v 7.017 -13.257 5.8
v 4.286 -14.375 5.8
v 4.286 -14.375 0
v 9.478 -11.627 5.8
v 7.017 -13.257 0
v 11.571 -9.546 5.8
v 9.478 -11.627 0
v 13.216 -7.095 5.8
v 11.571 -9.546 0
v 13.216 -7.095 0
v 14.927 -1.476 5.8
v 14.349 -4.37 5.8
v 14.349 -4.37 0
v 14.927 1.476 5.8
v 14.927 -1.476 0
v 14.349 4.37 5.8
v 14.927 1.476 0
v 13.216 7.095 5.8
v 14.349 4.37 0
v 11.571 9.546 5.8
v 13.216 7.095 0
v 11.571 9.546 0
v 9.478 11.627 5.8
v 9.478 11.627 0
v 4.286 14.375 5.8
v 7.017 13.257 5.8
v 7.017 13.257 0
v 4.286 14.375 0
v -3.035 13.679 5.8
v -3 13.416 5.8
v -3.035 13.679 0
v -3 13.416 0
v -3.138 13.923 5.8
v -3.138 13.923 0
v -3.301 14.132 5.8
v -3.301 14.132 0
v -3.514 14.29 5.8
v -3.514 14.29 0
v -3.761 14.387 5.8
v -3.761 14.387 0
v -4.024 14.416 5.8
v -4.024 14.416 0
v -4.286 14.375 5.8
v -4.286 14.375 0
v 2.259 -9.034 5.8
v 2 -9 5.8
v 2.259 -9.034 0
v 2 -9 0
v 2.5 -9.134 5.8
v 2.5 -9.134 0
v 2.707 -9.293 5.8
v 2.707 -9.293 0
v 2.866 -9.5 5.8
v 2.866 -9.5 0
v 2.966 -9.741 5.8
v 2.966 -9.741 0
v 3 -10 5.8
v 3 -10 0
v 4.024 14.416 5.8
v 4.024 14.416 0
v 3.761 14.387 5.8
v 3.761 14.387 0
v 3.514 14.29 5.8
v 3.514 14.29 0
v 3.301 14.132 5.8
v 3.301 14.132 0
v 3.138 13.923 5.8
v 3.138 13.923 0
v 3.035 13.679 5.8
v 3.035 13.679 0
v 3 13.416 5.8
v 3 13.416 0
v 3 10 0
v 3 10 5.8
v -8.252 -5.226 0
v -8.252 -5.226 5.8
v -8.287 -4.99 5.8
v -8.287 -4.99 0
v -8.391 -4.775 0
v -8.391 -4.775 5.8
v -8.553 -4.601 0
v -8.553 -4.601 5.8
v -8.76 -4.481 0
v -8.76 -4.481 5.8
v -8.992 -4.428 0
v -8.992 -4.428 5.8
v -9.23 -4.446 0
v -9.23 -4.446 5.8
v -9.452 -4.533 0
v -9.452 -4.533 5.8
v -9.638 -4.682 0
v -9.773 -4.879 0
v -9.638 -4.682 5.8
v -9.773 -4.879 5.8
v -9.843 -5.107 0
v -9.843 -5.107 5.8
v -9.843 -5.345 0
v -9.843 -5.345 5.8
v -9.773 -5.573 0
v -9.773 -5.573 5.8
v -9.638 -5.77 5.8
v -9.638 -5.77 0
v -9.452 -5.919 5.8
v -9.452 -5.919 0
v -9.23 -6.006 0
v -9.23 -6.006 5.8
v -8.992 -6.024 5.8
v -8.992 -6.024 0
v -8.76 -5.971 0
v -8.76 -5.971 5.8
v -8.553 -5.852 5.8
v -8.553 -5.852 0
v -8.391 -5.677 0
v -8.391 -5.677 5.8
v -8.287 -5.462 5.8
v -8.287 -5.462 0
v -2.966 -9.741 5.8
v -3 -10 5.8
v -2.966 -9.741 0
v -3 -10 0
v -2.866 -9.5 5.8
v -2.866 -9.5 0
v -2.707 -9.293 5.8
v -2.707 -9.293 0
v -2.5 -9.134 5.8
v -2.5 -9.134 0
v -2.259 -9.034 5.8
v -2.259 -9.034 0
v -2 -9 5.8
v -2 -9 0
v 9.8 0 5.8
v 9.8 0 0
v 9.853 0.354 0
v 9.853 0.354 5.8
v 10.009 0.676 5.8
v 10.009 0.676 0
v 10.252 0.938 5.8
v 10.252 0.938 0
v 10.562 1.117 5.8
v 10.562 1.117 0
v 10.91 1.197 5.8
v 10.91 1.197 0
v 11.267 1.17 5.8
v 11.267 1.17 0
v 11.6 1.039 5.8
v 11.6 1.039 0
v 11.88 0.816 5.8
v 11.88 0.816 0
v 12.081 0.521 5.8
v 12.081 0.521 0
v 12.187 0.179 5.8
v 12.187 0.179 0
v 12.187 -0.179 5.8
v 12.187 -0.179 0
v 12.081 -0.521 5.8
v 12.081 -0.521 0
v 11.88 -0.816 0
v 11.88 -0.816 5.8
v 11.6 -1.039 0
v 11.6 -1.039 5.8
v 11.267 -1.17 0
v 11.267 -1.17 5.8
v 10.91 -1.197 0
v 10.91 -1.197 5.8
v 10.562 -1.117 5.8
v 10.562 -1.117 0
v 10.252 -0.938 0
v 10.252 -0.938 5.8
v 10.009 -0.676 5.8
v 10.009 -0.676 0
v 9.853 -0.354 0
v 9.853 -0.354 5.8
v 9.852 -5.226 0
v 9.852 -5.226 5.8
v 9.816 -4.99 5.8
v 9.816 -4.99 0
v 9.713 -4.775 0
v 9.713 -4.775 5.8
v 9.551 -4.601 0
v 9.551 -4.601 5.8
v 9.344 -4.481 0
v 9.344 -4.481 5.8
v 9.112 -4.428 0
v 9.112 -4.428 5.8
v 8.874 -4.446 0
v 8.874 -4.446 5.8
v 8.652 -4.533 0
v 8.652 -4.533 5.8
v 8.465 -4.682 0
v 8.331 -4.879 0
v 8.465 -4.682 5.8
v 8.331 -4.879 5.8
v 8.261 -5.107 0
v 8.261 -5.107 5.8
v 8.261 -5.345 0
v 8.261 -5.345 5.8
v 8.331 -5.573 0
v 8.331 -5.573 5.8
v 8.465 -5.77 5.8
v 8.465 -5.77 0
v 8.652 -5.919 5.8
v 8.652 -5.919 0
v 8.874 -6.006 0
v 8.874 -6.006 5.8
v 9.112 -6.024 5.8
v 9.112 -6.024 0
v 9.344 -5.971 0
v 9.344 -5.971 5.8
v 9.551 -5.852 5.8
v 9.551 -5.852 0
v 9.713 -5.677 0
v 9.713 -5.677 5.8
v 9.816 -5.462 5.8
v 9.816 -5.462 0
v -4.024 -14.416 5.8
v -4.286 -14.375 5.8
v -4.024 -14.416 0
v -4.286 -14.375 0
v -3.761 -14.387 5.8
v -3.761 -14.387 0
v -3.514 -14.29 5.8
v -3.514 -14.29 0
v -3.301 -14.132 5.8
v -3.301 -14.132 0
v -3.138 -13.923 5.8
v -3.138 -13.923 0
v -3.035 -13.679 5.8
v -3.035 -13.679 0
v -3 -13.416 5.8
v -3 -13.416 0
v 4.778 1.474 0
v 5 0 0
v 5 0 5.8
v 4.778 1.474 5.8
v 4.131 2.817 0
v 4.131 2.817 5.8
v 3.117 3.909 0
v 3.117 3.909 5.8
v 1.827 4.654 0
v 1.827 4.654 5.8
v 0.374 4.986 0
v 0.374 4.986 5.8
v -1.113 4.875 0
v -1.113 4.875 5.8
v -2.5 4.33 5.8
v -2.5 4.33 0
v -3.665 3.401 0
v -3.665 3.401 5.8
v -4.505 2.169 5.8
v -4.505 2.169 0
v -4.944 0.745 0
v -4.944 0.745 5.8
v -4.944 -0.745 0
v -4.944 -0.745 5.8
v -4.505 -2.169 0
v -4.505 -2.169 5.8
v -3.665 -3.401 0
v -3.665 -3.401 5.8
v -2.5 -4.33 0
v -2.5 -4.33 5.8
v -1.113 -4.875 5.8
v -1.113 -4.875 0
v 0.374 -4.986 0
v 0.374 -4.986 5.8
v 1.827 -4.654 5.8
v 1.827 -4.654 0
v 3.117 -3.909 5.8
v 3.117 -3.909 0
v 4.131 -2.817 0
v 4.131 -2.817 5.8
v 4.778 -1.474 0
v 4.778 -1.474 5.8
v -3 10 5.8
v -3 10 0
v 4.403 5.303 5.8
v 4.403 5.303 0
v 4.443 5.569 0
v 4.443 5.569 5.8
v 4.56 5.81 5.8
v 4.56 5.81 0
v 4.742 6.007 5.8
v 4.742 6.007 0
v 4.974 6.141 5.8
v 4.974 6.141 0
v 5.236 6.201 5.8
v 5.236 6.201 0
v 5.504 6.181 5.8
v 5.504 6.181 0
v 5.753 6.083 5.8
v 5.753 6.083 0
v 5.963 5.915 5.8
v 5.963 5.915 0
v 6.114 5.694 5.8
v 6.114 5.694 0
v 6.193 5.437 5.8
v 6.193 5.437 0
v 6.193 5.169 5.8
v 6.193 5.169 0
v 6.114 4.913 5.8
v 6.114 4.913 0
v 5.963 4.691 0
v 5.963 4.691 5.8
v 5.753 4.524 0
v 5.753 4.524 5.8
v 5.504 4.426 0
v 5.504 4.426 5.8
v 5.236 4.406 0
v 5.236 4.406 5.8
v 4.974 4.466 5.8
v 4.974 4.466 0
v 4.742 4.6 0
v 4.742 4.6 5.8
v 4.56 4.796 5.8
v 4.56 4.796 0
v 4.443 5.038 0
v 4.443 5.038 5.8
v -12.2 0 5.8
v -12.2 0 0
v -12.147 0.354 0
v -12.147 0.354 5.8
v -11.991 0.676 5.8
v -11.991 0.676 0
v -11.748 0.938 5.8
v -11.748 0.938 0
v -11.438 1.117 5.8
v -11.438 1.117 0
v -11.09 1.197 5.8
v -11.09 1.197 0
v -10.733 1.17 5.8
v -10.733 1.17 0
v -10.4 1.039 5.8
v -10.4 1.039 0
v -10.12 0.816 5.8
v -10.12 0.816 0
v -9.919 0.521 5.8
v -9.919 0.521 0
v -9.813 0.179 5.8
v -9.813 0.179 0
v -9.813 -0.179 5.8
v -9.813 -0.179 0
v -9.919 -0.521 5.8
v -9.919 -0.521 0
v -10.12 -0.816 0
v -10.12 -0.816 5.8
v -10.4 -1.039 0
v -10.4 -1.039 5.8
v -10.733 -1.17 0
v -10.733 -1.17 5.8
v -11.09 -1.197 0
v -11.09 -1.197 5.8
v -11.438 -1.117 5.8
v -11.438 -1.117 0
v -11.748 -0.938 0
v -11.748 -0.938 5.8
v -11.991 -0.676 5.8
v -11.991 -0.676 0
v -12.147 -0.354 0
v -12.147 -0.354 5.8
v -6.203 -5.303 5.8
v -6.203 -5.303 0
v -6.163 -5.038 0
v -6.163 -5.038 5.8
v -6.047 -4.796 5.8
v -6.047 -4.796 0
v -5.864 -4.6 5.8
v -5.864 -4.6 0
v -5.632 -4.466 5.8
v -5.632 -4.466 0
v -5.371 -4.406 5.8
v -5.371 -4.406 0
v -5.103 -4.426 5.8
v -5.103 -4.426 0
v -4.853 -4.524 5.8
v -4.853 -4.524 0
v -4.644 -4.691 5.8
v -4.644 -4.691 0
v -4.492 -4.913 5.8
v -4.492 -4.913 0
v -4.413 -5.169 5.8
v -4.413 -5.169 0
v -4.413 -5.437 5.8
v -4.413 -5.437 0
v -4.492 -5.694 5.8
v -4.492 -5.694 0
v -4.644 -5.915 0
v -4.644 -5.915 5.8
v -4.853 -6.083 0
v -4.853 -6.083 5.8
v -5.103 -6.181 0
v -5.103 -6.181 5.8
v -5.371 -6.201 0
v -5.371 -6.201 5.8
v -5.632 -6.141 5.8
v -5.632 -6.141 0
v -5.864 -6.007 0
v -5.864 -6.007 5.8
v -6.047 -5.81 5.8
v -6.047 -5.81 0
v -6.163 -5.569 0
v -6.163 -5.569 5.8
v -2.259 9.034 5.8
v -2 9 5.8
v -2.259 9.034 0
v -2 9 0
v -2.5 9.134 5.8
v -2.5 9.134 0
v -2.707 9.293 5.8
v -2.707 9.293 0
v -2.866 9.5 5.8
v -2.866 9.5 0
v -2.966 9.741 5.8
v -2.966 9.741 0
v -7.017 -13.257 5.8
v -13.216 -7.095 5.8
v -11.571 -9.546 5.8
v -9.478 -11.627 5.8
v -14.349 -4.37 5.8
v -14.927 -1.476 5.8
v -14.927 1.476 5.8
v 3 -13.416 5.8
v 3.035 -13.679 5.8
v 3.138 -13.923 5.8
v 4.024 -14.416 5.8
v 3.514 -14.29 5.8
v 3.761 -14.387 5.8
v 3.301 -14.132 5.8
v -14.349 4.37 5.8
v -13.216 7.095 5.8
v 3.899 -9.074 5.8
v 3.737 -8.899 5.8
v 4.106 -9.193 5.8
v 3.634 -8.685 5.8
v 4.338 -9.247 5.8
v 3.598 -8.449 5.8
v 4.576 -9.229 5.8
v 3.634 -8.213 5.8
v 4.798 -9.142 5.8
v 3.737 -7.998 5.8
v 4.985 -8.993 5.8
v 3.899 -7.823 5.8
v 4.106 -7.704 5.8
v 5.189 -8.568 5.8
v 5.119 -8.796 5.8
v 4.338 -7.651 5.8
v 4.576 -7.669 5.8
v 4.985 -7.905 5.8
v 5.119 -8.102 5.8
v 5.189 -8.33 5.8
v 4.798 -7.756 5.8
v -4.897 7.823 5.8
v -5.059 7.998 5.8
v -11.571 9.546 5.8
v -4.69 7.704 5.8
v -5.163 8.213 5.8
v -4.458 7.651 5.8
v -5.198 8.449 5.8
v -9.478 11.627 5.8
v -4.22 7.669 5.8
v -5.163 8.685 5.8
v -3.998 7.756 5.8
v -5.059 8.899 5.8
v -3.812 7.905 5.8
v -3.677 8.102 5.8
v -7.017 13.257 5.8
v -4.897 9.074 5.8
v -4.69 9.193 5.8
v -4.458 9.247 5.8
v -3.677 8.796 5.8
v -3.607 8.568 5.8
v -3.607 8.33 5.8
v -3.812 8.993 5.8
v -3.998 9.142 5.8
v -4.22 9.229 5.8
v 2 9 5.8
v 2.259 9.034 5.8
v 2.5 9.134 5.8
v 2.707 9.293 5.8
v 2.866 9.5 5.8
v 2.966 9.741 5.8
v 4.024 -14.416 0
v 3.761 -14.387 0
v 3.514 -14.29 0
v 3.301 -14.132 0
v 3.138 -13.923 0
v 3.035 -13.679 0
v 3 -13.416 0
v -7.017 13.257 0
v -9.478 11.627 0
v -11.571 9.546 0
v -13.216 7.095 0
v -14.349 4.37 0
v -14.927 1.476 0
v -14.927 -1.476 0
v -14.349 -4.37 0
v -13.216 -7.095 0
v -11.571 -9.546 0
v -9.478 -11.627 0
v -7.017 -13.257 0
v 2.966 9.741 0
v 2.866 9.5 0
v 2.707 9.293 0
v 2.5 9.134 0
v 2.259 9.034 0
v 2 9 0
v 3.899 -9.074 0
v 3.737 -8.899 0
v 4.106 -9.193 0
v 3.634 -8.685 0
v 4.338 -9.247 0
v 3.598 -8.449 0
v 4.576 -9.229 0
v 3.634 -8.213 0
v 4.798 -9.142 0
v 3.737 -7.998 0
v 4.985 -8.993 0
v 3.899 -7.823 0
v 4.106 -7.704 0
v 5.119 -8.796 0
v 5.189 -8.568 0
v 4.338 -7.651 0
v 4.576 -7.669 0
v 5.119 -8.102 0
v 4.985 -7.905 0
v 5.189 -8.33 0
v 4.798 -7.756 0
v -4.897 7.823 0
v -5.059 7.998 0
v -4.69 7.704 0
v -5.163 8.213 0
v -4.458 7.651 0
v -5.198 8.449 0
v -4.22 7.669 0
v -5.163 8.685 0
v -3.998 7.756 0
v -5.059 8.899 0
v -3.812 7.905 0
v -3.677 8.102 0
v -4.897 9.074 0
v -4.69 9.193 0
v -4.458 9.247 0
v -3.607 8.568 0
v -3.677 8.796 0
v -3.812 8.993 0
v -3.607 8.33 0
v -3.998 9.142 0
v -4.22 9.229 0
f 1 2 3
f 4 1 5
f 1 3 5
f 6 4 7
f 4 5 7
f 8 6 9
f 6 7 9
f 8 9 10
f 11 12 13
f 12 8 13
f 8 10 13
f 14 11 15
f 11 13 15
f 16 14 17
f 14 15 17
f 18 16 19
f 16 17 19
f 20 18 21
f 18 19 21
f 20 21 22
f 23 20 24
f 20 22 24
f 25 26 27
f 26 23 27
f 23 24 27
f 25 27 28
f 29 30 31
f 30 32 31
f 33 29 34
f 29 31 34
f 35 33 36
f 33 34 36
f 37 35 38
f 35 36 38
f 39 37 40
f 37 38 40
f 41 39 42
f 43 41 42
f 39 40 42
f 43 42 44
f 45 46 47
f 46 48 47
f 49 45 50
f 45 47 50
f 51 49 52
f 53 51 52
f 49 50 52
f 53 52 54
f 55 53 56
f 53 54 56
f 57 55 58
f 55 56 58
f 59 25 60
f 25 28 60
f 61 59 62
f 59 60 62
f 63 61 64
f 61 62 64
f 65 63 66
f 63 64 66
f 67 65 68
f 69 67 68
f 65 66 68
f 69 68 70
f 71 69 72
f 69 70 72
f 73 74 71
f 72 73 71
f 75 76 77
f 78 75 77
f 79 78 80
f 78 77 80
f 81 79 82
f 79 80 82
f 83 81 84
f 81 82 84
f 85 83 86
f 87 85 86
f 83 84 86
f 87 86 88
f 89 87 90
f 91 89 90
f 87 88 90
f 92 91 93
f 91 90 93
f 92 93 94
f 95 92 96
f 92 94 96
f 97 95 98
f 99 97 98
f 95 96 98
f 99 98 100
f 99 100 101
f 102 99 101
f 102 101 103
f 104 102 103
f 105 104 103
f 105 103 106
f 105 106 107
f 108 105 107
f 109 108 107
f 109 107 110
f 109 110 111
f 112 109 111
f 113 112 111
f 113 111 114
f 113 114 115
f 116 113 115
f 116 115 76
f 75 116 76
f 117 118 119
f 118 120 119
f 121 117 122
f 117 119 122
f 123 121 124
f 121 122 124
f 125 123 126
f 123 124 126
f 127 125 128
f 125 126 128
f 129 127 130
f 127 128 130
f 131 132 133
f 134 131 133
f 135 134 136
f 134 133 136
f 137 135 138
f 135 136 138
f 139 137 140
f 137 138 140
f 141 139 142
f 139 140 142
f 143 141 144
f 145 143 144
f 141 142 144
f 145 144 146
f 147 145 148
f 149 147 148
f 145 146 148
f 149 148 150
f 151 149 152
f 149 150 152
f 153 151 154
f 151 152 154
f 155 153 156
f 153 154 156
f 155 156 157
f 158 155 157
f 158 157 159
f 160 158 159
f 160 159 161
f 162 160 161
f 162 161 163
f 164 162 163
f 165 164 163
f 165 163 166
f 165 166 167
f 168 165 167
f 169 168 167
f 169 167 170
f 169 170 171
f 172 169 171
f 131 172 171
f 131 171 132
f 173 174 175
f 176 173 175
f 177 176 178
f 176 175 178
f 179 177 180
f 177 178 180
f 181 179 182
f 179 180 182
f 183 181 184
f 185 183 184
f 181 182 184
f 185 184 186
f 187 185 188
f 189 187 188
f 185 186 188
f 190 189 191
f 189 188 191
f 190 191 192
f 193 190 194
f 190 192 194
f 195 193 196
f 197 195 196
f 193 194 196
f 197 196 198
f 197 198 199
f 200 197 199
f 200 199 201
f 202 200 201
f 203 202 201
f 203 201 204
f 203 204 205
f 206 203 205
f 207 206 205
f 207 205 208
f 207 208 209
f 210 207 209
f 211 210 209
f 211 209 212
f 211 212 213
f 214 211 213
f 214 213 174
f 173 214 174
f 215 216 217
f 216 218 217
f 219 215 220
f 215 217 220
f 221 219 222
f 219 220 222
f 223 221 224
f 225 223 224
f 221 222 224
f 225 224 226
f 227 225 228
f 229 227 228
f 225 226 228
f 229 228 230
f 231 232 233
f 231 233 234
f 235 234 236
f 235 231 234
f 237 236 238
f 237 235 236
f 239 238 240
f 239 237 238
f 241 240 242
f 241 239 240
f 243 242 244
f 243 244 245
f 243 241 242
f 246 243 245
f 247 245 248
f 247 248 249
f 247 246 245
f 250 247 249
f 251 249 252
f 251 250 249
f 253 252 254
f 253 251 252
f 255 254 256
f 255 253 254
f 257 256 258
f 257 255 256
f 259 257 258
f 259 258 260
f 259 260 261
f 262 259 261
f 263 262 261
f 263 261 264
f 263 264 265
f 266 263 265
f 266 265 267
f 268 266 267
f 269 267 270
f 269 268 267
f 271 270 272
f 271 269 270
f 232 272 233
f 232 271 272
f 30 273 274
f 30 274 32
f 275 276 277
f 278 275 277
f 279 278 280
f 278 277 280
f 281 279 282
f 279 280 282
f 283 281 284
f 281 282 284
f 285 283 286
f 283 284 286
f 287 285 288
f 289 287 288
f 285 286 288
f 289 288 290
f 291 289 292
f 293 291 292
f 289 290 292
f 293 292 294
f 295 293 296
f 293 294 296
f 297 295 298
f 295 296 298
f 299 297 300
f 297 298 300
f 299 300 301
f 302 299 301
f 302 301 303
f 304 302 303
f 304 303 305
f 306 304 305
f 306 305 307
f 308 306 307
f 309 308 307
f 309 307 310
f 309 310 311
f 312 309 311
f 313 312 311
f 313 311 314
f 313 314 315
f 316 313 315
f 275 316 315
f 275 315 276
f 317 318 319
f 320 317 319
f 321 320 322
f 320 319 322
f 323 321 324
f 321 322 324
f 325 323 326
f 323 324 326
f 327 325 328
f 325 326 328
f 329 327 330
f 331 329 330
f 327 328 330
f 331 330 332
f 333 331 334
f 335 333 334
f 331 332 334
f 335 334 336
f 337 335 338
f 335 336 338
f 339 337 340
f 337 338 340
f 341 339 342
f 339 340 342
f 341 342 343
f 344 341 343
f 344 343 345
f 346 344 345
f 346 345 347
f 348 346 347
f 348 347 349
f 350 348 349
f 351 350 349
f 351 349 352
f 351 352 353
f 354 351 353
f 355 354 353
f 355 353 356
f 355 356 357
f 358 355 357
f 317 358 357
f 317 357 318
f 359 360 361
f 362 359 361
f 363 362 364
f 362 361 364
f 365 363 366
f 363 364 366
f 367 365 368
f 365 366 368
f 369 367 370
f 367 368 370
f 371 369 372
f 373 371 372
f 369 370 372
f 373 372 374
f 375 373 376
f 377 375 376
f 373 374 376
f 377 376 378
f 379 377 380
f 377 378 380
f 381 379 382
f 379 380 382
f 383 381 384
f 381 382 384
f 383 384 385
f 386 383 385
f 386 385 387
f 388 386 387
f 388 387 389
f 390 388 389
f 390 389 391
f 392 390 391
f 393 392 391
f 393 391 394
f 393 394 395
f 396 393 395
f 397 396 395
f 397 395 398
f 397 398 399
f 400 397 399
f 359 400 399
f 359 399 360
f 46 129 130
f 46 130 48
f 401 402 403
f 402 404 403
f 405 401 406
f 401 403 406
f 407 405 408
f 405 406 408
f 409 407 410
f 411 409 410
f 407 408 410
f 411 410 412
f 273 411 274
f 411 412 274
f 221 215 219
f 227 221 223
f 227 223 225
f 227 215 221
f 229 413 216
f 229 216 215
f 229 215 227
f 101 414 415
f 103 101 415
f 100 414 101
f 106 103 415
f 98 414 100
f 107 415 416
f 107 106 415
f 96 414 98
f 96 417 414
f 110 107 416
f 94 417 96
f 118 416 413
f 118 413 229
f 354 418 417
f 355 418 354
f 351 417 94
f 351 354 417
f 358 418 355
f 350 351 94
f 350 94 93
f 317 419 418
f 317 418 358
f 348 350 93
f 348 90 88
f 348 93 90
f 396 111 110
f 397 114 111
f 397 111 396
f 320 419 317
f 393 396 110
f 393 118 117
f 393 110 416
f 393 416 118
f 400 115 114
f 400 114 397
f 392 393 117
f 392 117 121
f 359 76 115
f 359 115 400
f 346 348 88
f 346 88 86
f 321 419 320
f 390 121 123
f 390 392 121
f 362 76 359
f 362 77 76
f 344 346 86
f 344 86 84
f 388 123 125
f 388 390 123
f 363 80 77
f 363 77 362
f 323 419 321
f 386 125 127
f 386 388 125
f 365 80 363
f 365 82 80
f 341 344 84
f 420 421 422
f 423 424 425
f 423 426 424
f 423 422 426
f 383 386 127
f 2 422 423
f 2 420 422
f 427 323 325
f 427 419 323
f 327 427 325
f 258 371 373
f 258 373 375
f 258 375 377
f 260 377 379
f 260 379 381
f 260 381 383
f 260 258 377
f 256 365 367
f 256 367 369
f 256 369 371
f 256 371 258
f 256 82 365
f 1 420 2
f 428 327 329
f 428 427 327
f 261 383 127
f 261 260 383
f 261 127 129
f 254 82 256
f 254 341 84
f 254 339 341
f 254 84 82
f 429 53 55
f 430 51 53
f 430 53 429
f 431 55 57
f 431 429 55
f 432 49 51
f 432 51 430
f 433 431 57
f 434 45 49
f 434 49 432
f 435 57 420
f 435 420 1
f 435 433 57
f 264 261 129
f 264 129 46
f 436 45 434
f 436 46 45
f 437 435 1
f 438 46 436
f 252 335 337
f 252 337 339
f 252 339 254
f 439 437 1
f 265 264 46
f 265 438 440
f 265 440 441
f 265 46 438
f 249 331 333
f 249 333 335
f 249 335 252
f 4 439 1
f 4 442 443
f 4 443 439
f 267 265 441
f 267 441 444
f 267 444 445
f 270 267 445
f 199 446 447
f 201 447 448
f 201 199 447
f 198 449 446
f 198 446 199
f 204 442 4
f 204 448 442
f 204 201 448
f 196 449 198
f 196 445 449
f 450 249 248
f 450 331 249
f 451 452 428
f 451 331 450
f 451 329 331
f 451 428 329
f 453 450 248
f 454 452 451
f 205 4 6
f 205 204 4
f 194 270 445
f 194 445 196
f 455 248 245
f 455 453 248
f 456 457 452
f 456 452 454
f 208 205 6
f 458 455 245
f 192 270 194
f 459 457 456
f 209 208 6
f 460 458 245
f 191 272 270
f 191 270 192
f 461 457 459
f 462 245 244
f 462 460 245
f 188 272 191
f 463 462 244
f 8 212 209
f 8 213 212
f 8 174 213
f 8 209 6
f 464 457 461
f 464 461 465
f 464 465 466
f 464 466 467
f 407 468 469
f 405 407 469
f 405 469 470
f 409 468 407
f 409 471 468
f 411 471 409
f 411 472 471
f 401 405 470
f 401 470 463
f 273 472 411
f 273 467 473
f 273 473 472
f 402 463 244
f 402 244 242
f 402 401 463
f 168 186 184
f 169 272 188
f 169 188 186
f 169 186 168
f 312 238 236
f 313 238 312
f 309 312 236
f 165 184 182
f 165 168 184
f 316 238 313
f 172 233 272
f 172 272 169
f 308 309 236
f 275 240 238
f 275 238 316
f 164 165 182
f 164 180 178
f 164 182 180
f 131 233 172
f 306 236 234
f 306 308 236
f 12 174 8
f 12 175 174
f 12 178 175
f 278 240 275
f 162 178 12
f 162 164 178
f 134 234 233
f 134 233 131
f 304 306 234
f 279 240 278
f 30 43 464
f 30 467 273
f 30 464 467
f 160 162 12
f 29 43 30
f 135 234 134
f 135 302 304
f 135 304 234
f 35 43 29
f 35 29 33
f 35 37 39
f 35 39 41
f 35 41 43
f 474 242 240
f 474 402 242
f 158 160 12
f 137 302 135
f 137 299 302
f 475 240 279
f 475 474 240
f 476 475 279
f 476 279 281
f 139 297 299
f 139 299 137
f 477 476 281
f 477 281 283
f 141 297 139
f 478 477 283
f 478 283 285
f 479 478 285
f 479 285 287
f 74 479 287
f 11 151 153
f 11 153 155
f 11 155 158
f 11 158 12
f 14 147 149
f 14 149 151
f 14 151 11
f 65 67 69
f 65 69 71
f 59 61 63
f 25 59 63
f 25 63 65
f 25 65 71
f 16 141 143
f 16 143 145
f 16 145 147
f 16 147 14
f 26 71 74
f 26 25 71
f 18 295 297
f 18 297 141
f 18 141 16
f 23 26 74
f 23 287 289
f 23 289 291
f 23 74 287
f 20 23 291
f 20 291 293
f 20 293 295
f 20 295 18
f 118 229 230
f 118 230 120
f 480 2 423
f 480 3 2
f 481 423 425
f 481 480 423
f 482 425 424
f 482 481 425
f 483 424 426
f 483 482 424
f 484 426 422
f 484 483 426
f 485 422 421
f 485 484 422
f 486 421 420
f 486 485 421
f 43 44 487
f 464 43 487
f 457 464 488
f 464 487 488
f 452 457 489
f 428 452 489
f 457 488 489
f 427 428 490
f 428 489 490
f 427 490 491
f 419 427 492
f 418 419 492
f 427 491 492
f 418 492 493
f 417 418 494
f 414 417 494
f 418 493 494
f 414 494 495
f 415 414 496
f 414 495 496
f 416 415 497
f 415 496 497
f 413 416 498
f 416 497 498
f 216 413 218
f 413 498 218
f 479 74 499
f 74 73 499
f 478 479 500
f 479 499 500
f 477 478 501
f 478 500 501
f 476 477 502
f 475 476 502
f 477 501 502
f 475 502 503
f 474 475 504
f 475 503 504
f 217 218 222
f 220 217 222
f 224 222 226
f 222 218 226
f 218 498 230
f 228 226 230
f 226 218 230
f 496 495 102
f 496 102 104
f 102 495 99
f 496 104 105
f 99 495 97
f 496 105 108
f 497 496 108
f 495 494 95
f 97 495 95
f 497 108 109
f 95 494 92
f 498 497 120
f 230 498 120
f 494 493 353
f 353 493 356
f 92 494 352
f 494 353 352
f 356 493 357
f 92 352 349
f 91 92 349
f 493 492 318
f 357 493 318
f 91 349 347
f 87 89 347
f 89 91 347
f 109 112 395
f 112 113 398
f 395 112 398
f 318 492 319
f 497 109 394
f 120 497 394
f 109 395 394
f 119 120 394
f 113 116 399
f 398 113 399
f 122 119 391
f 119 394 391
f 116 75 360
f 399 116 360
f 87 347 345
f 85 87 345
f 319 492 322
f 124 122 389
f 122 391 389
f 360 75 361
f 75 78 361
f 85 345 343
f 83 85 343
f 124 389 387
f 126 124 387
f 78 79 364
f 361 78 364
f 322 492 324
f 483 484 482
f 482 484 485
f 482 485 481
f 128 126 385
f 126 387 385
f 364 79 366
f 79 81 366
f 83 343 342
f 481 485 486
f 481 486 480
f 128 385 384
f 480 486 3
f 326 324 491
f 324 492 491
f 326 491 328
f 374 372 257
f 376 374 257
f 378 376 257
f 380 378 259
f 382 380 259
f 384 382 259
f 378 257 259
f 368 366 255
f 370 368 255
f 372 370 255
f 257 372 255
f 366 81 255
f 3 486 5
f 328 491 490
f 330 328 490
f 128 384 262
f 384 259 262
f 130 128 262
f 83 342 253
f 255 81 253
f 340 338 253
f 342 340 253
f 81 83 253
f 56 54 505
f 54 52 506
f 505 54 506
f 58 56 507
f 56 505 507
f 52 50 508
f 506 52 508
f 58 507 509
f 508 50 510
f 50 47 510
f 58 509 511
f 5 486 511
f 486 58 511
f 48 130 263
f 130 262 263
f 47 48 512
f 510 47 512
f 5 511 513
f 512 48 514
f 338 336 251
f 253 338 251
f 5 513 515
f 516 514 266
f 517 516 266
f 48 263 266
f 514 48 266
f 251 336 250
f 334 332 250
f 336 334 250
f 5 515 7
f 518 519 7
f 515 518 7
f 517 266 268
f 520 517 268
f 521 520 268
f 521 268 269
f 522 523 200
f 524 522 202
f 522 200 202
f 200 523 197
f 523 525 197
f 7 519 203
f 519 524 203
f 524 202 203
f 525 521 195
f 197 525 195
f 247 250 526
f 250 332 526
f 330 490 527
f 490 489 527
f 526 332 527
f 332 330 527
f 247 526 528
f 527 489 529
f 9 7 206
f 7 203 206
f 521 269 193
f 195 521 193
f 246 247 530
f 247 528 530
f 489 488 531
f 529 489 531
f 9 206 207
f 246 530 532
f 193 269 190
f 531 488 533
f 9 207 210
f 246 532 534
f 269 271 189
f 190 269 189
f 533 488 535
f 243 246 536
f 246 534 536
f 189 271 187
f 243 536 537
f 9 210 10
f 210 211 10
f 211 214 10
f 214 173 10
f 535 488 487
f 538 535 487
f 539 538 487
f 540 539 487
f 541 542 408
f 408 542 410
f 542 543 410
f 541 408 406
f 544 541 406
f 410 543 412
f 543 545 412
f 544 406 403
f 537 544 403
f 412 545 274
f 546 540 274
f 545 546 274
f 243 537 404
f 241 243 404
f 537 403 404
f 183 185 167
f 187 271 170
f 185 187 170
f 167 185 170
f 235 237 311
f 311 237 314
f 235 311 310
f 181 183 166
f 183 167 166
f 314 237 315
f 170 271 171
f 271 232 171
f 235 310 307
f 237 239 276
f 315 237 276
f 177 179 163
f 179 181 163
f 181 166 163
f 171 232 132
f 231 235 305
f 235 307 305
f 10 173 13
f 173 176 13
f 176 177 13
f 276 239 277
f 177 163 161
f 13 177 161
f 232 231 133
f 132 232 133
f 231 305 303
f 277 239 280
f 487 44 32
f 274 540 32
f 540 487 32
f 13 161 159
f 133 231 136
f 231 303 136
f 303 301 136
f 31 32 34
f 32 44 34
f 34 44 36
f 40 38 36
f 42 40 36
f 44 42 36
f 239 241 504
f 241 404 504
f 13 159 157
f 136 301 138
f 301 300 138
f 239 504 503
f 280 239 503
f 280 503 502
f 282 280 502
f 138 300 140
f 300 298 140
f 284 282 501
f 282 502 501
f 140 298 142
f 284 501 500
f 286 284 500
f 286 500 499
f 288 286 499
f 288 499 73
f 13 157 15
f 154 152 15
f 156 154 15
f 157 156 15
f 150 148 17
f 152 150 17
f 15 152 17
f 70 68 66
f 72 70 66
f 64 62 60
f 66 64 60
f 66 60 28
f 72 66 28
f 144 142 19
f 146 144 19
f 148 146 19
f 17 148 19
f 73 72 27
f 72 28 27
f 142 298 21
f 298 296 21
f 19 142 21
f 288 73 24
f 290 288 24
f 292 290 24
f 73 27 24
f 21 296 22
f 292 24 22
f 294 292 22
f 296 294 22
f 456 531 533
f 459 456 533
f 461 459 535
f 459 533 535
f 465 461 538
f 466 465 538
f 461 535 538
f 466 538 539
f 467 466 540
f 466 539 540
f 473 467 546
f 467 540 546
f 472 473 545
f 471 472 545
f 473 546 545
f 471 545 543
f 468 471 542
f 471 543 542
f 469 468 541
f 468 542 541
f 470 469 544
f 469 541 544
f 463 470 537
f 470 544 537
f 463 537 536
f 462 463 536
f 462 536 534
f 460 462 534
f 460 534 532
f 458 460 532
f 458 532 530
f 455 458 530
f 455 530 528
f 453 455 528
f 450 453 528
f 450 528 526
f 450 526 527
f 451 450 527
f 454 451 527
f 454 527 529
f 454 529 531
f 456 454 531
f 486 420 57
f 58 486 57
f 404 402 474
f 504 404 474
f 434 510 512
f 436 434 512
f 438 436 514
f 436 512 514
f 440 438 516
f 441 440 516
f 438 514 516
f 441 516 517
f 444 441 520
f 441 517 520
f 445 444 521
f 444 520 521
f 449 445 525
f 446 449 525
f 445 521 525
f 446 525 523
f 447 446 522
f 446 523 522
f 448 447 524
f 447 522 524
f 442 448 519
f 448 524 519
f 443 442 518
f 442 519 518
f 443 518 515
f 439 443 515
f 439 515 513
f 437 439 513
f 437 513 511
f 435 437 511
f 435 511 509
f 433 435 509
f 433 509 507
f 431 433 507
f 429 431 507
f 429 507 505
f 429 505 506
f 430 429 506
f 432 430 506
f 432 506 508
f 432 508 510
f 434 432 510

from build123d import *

# Parameters (mm, degrees)
SKETCH1_R                  = 15
SKETCH1_R_2                = 5
BOSS_EXTRUDE1_DEPTH        = 5.8
M2_CLEARANCE_HOLE1_D       = 2.4
M2_CLEARANCE_HOLE1_DEPTH   = 25.4
M2_CLEARANCE_HOLE1_TIP     = 0.721032743
M1_6_CLEARANCE_HOLE1_D     = 1.8
M1_6_CLEARANCE_HOLE1_DEPTH = 25.4
M1_6_CLEARANCE_HOLE1_TIP   = 0.540774557
SKETCH8_W                  = 6
SKETCH8_H                  = 6
CUT_EXTRUDE1_DEPTH         = 22.99181666
FILLET1_R                  = 1
M2X0_4_TAPPED_HOLE1_D      = 1.6
M2X0_4_TAPPED_HOLE1_DEPTH  = 5.99948
M2X0_4_TAPPED_HOLE1_TIP    = 0.480688495
M2X0_4_TAPPED_HOLE2_D      = 1.6
M2X0_4_TAPPED_HOLE2_DEPTH  = 5.99948
M2X0_4_TAPPED_HOLE2_TIP    = 0.480688495


with BuildPart() as part:
    # Sketch1 → Boss-Extrude1 (new body)
    with BuildSketch(Plane.XY):
        Circle(SKETCH1_R)
        Circle(SKETCH1_R_2, mode=Mode.SUBTRACT)
    extrude(amount=BOSS_EXTRUDE1_DEPTH)

    # M2 Clearance Hole1
    with Locations(Plane.XY.offset(5.8)):
        with Locations((-11, 0), (11, 0)):
            Hole(M2_CLEARANCE_HOLE1_D / 2, depth=M2_CLEARANCE_HOLE1_DEPTH)
            with Locations((0, 0, -(M2_CLEARANCE_HOLE1_DEPTH + M2_CLEARANCE_HOLE1_TIP / 2))):  # 118° drill point
                Cone(0, M2_CLEARANCE_HOLE1_D / 2, M2_CLEARANCE_HOLE1_TIP, mode=Mode.SUBTRACT)

    # M1.6 Clearance Hole1
    with Locations(Plane.XY.offset(5.8)):
        with Locations((5.303300859, 5.303300859), (-5.303300859, -5.303300859)):
            Hole(M1_6_CLEARANCE_HOLE1_D / 2, depth=M1_6_CLEARANCE_HOLE1_DEPTH)
            with Locations((0, 0, -(M1_6_CLEARANCE_HOLE1_DEPTH + M1_6_CLEARANCE_HOLE1_TIP / 2))):  # 118° drill point
                Cone(0, M1_6_CLEARANCE_HOLE1_D / 2, M1_6_CLEARANCE_HOLE1_TIP, mode=Mode.SUBTRACT)

    # Sketch8 → Cut-Extrude1 (cut, through all)
    with BuildSketch(Plane.XY.offset(5.8)):
        with Locations((0, -12)):
            Rectangle(SKETCH8_W, SKETCH8_H)
        with Locations((0, 12)):
            Rectangle(SKETCH8_W, SKETCH8_H)
    extrude(amount=-CUT_EXTRUDE1_DEPTH, mode=Mode.SUBTRACT)

    # Fillet1
    fillet1_edges = [part.edges().sort_by_distance(p)[0] for p in [
        (-3, -14.696938457, 2.9),
        (3, -14.696938457, 2.9),
        (3, -9, 2.9),
        (-3, -9, 2.9),
        (-3, 14.696938457, 2.9),
        (3, 14.696938457, 2.9),
        (-3, 9, 2.9),
        (3, 9, 2.9),
    ]]
    fillet(fillet1_edges, radius=FILLET1_R)

    # M2x0.4 Tapped Hole1
    with Locations(Plane.XY.offset(5.8)):
        with Locations((-4.398155541, 8.448778186), (4.398155541, -8.448778186)):
            Hole(M2X0_4_TAPPED_HOLE1_D / 2, depth=M2X0_4_TAPPED_HOLE1_DEPTH)
            with Locations((0, 0, -(M2X0_4_TAPPED_HOLE1_DEPTH + M2X0_4_TAPPED_HOLE1_TIP / 2))):  # 118° drill point
                Cone(0, M2X0_4_TAPPED_HOLE1_D / 2, M2X0_4_TAPPED_HOLE1_TIP, mode=Mode.SUBTRACT)

    # M2x0.4 Tapped Hole2
    with Locations(Plane(origin=(0, 0, 0), x_dir=(-1, 0, 0), z_dir=(0, 0, -1))):
        with Locations((9.051784123, -5.22605), (-9.051784123, -5.22605), (0, 10.4521)):
            Hole(M2X0_4_TAPPED_HOLE2_D / 2, depth=M2X0_4_TAPPED_HOLE2_DEPTH)
            with Locations((0, 0, -(M2X0_4_TAPPED_HOLE2_DEPTH + M2X0_4_TAPPED_HOLE2_TIP / 2))):  # 118° drill point
                Cone(0, M2X0_4_TAPPED_HOLE2_D / 2, M2X0_4_TAPPED_HOLE2_TIP, mode=Mode.SUBTRACT)


solid = part.part
